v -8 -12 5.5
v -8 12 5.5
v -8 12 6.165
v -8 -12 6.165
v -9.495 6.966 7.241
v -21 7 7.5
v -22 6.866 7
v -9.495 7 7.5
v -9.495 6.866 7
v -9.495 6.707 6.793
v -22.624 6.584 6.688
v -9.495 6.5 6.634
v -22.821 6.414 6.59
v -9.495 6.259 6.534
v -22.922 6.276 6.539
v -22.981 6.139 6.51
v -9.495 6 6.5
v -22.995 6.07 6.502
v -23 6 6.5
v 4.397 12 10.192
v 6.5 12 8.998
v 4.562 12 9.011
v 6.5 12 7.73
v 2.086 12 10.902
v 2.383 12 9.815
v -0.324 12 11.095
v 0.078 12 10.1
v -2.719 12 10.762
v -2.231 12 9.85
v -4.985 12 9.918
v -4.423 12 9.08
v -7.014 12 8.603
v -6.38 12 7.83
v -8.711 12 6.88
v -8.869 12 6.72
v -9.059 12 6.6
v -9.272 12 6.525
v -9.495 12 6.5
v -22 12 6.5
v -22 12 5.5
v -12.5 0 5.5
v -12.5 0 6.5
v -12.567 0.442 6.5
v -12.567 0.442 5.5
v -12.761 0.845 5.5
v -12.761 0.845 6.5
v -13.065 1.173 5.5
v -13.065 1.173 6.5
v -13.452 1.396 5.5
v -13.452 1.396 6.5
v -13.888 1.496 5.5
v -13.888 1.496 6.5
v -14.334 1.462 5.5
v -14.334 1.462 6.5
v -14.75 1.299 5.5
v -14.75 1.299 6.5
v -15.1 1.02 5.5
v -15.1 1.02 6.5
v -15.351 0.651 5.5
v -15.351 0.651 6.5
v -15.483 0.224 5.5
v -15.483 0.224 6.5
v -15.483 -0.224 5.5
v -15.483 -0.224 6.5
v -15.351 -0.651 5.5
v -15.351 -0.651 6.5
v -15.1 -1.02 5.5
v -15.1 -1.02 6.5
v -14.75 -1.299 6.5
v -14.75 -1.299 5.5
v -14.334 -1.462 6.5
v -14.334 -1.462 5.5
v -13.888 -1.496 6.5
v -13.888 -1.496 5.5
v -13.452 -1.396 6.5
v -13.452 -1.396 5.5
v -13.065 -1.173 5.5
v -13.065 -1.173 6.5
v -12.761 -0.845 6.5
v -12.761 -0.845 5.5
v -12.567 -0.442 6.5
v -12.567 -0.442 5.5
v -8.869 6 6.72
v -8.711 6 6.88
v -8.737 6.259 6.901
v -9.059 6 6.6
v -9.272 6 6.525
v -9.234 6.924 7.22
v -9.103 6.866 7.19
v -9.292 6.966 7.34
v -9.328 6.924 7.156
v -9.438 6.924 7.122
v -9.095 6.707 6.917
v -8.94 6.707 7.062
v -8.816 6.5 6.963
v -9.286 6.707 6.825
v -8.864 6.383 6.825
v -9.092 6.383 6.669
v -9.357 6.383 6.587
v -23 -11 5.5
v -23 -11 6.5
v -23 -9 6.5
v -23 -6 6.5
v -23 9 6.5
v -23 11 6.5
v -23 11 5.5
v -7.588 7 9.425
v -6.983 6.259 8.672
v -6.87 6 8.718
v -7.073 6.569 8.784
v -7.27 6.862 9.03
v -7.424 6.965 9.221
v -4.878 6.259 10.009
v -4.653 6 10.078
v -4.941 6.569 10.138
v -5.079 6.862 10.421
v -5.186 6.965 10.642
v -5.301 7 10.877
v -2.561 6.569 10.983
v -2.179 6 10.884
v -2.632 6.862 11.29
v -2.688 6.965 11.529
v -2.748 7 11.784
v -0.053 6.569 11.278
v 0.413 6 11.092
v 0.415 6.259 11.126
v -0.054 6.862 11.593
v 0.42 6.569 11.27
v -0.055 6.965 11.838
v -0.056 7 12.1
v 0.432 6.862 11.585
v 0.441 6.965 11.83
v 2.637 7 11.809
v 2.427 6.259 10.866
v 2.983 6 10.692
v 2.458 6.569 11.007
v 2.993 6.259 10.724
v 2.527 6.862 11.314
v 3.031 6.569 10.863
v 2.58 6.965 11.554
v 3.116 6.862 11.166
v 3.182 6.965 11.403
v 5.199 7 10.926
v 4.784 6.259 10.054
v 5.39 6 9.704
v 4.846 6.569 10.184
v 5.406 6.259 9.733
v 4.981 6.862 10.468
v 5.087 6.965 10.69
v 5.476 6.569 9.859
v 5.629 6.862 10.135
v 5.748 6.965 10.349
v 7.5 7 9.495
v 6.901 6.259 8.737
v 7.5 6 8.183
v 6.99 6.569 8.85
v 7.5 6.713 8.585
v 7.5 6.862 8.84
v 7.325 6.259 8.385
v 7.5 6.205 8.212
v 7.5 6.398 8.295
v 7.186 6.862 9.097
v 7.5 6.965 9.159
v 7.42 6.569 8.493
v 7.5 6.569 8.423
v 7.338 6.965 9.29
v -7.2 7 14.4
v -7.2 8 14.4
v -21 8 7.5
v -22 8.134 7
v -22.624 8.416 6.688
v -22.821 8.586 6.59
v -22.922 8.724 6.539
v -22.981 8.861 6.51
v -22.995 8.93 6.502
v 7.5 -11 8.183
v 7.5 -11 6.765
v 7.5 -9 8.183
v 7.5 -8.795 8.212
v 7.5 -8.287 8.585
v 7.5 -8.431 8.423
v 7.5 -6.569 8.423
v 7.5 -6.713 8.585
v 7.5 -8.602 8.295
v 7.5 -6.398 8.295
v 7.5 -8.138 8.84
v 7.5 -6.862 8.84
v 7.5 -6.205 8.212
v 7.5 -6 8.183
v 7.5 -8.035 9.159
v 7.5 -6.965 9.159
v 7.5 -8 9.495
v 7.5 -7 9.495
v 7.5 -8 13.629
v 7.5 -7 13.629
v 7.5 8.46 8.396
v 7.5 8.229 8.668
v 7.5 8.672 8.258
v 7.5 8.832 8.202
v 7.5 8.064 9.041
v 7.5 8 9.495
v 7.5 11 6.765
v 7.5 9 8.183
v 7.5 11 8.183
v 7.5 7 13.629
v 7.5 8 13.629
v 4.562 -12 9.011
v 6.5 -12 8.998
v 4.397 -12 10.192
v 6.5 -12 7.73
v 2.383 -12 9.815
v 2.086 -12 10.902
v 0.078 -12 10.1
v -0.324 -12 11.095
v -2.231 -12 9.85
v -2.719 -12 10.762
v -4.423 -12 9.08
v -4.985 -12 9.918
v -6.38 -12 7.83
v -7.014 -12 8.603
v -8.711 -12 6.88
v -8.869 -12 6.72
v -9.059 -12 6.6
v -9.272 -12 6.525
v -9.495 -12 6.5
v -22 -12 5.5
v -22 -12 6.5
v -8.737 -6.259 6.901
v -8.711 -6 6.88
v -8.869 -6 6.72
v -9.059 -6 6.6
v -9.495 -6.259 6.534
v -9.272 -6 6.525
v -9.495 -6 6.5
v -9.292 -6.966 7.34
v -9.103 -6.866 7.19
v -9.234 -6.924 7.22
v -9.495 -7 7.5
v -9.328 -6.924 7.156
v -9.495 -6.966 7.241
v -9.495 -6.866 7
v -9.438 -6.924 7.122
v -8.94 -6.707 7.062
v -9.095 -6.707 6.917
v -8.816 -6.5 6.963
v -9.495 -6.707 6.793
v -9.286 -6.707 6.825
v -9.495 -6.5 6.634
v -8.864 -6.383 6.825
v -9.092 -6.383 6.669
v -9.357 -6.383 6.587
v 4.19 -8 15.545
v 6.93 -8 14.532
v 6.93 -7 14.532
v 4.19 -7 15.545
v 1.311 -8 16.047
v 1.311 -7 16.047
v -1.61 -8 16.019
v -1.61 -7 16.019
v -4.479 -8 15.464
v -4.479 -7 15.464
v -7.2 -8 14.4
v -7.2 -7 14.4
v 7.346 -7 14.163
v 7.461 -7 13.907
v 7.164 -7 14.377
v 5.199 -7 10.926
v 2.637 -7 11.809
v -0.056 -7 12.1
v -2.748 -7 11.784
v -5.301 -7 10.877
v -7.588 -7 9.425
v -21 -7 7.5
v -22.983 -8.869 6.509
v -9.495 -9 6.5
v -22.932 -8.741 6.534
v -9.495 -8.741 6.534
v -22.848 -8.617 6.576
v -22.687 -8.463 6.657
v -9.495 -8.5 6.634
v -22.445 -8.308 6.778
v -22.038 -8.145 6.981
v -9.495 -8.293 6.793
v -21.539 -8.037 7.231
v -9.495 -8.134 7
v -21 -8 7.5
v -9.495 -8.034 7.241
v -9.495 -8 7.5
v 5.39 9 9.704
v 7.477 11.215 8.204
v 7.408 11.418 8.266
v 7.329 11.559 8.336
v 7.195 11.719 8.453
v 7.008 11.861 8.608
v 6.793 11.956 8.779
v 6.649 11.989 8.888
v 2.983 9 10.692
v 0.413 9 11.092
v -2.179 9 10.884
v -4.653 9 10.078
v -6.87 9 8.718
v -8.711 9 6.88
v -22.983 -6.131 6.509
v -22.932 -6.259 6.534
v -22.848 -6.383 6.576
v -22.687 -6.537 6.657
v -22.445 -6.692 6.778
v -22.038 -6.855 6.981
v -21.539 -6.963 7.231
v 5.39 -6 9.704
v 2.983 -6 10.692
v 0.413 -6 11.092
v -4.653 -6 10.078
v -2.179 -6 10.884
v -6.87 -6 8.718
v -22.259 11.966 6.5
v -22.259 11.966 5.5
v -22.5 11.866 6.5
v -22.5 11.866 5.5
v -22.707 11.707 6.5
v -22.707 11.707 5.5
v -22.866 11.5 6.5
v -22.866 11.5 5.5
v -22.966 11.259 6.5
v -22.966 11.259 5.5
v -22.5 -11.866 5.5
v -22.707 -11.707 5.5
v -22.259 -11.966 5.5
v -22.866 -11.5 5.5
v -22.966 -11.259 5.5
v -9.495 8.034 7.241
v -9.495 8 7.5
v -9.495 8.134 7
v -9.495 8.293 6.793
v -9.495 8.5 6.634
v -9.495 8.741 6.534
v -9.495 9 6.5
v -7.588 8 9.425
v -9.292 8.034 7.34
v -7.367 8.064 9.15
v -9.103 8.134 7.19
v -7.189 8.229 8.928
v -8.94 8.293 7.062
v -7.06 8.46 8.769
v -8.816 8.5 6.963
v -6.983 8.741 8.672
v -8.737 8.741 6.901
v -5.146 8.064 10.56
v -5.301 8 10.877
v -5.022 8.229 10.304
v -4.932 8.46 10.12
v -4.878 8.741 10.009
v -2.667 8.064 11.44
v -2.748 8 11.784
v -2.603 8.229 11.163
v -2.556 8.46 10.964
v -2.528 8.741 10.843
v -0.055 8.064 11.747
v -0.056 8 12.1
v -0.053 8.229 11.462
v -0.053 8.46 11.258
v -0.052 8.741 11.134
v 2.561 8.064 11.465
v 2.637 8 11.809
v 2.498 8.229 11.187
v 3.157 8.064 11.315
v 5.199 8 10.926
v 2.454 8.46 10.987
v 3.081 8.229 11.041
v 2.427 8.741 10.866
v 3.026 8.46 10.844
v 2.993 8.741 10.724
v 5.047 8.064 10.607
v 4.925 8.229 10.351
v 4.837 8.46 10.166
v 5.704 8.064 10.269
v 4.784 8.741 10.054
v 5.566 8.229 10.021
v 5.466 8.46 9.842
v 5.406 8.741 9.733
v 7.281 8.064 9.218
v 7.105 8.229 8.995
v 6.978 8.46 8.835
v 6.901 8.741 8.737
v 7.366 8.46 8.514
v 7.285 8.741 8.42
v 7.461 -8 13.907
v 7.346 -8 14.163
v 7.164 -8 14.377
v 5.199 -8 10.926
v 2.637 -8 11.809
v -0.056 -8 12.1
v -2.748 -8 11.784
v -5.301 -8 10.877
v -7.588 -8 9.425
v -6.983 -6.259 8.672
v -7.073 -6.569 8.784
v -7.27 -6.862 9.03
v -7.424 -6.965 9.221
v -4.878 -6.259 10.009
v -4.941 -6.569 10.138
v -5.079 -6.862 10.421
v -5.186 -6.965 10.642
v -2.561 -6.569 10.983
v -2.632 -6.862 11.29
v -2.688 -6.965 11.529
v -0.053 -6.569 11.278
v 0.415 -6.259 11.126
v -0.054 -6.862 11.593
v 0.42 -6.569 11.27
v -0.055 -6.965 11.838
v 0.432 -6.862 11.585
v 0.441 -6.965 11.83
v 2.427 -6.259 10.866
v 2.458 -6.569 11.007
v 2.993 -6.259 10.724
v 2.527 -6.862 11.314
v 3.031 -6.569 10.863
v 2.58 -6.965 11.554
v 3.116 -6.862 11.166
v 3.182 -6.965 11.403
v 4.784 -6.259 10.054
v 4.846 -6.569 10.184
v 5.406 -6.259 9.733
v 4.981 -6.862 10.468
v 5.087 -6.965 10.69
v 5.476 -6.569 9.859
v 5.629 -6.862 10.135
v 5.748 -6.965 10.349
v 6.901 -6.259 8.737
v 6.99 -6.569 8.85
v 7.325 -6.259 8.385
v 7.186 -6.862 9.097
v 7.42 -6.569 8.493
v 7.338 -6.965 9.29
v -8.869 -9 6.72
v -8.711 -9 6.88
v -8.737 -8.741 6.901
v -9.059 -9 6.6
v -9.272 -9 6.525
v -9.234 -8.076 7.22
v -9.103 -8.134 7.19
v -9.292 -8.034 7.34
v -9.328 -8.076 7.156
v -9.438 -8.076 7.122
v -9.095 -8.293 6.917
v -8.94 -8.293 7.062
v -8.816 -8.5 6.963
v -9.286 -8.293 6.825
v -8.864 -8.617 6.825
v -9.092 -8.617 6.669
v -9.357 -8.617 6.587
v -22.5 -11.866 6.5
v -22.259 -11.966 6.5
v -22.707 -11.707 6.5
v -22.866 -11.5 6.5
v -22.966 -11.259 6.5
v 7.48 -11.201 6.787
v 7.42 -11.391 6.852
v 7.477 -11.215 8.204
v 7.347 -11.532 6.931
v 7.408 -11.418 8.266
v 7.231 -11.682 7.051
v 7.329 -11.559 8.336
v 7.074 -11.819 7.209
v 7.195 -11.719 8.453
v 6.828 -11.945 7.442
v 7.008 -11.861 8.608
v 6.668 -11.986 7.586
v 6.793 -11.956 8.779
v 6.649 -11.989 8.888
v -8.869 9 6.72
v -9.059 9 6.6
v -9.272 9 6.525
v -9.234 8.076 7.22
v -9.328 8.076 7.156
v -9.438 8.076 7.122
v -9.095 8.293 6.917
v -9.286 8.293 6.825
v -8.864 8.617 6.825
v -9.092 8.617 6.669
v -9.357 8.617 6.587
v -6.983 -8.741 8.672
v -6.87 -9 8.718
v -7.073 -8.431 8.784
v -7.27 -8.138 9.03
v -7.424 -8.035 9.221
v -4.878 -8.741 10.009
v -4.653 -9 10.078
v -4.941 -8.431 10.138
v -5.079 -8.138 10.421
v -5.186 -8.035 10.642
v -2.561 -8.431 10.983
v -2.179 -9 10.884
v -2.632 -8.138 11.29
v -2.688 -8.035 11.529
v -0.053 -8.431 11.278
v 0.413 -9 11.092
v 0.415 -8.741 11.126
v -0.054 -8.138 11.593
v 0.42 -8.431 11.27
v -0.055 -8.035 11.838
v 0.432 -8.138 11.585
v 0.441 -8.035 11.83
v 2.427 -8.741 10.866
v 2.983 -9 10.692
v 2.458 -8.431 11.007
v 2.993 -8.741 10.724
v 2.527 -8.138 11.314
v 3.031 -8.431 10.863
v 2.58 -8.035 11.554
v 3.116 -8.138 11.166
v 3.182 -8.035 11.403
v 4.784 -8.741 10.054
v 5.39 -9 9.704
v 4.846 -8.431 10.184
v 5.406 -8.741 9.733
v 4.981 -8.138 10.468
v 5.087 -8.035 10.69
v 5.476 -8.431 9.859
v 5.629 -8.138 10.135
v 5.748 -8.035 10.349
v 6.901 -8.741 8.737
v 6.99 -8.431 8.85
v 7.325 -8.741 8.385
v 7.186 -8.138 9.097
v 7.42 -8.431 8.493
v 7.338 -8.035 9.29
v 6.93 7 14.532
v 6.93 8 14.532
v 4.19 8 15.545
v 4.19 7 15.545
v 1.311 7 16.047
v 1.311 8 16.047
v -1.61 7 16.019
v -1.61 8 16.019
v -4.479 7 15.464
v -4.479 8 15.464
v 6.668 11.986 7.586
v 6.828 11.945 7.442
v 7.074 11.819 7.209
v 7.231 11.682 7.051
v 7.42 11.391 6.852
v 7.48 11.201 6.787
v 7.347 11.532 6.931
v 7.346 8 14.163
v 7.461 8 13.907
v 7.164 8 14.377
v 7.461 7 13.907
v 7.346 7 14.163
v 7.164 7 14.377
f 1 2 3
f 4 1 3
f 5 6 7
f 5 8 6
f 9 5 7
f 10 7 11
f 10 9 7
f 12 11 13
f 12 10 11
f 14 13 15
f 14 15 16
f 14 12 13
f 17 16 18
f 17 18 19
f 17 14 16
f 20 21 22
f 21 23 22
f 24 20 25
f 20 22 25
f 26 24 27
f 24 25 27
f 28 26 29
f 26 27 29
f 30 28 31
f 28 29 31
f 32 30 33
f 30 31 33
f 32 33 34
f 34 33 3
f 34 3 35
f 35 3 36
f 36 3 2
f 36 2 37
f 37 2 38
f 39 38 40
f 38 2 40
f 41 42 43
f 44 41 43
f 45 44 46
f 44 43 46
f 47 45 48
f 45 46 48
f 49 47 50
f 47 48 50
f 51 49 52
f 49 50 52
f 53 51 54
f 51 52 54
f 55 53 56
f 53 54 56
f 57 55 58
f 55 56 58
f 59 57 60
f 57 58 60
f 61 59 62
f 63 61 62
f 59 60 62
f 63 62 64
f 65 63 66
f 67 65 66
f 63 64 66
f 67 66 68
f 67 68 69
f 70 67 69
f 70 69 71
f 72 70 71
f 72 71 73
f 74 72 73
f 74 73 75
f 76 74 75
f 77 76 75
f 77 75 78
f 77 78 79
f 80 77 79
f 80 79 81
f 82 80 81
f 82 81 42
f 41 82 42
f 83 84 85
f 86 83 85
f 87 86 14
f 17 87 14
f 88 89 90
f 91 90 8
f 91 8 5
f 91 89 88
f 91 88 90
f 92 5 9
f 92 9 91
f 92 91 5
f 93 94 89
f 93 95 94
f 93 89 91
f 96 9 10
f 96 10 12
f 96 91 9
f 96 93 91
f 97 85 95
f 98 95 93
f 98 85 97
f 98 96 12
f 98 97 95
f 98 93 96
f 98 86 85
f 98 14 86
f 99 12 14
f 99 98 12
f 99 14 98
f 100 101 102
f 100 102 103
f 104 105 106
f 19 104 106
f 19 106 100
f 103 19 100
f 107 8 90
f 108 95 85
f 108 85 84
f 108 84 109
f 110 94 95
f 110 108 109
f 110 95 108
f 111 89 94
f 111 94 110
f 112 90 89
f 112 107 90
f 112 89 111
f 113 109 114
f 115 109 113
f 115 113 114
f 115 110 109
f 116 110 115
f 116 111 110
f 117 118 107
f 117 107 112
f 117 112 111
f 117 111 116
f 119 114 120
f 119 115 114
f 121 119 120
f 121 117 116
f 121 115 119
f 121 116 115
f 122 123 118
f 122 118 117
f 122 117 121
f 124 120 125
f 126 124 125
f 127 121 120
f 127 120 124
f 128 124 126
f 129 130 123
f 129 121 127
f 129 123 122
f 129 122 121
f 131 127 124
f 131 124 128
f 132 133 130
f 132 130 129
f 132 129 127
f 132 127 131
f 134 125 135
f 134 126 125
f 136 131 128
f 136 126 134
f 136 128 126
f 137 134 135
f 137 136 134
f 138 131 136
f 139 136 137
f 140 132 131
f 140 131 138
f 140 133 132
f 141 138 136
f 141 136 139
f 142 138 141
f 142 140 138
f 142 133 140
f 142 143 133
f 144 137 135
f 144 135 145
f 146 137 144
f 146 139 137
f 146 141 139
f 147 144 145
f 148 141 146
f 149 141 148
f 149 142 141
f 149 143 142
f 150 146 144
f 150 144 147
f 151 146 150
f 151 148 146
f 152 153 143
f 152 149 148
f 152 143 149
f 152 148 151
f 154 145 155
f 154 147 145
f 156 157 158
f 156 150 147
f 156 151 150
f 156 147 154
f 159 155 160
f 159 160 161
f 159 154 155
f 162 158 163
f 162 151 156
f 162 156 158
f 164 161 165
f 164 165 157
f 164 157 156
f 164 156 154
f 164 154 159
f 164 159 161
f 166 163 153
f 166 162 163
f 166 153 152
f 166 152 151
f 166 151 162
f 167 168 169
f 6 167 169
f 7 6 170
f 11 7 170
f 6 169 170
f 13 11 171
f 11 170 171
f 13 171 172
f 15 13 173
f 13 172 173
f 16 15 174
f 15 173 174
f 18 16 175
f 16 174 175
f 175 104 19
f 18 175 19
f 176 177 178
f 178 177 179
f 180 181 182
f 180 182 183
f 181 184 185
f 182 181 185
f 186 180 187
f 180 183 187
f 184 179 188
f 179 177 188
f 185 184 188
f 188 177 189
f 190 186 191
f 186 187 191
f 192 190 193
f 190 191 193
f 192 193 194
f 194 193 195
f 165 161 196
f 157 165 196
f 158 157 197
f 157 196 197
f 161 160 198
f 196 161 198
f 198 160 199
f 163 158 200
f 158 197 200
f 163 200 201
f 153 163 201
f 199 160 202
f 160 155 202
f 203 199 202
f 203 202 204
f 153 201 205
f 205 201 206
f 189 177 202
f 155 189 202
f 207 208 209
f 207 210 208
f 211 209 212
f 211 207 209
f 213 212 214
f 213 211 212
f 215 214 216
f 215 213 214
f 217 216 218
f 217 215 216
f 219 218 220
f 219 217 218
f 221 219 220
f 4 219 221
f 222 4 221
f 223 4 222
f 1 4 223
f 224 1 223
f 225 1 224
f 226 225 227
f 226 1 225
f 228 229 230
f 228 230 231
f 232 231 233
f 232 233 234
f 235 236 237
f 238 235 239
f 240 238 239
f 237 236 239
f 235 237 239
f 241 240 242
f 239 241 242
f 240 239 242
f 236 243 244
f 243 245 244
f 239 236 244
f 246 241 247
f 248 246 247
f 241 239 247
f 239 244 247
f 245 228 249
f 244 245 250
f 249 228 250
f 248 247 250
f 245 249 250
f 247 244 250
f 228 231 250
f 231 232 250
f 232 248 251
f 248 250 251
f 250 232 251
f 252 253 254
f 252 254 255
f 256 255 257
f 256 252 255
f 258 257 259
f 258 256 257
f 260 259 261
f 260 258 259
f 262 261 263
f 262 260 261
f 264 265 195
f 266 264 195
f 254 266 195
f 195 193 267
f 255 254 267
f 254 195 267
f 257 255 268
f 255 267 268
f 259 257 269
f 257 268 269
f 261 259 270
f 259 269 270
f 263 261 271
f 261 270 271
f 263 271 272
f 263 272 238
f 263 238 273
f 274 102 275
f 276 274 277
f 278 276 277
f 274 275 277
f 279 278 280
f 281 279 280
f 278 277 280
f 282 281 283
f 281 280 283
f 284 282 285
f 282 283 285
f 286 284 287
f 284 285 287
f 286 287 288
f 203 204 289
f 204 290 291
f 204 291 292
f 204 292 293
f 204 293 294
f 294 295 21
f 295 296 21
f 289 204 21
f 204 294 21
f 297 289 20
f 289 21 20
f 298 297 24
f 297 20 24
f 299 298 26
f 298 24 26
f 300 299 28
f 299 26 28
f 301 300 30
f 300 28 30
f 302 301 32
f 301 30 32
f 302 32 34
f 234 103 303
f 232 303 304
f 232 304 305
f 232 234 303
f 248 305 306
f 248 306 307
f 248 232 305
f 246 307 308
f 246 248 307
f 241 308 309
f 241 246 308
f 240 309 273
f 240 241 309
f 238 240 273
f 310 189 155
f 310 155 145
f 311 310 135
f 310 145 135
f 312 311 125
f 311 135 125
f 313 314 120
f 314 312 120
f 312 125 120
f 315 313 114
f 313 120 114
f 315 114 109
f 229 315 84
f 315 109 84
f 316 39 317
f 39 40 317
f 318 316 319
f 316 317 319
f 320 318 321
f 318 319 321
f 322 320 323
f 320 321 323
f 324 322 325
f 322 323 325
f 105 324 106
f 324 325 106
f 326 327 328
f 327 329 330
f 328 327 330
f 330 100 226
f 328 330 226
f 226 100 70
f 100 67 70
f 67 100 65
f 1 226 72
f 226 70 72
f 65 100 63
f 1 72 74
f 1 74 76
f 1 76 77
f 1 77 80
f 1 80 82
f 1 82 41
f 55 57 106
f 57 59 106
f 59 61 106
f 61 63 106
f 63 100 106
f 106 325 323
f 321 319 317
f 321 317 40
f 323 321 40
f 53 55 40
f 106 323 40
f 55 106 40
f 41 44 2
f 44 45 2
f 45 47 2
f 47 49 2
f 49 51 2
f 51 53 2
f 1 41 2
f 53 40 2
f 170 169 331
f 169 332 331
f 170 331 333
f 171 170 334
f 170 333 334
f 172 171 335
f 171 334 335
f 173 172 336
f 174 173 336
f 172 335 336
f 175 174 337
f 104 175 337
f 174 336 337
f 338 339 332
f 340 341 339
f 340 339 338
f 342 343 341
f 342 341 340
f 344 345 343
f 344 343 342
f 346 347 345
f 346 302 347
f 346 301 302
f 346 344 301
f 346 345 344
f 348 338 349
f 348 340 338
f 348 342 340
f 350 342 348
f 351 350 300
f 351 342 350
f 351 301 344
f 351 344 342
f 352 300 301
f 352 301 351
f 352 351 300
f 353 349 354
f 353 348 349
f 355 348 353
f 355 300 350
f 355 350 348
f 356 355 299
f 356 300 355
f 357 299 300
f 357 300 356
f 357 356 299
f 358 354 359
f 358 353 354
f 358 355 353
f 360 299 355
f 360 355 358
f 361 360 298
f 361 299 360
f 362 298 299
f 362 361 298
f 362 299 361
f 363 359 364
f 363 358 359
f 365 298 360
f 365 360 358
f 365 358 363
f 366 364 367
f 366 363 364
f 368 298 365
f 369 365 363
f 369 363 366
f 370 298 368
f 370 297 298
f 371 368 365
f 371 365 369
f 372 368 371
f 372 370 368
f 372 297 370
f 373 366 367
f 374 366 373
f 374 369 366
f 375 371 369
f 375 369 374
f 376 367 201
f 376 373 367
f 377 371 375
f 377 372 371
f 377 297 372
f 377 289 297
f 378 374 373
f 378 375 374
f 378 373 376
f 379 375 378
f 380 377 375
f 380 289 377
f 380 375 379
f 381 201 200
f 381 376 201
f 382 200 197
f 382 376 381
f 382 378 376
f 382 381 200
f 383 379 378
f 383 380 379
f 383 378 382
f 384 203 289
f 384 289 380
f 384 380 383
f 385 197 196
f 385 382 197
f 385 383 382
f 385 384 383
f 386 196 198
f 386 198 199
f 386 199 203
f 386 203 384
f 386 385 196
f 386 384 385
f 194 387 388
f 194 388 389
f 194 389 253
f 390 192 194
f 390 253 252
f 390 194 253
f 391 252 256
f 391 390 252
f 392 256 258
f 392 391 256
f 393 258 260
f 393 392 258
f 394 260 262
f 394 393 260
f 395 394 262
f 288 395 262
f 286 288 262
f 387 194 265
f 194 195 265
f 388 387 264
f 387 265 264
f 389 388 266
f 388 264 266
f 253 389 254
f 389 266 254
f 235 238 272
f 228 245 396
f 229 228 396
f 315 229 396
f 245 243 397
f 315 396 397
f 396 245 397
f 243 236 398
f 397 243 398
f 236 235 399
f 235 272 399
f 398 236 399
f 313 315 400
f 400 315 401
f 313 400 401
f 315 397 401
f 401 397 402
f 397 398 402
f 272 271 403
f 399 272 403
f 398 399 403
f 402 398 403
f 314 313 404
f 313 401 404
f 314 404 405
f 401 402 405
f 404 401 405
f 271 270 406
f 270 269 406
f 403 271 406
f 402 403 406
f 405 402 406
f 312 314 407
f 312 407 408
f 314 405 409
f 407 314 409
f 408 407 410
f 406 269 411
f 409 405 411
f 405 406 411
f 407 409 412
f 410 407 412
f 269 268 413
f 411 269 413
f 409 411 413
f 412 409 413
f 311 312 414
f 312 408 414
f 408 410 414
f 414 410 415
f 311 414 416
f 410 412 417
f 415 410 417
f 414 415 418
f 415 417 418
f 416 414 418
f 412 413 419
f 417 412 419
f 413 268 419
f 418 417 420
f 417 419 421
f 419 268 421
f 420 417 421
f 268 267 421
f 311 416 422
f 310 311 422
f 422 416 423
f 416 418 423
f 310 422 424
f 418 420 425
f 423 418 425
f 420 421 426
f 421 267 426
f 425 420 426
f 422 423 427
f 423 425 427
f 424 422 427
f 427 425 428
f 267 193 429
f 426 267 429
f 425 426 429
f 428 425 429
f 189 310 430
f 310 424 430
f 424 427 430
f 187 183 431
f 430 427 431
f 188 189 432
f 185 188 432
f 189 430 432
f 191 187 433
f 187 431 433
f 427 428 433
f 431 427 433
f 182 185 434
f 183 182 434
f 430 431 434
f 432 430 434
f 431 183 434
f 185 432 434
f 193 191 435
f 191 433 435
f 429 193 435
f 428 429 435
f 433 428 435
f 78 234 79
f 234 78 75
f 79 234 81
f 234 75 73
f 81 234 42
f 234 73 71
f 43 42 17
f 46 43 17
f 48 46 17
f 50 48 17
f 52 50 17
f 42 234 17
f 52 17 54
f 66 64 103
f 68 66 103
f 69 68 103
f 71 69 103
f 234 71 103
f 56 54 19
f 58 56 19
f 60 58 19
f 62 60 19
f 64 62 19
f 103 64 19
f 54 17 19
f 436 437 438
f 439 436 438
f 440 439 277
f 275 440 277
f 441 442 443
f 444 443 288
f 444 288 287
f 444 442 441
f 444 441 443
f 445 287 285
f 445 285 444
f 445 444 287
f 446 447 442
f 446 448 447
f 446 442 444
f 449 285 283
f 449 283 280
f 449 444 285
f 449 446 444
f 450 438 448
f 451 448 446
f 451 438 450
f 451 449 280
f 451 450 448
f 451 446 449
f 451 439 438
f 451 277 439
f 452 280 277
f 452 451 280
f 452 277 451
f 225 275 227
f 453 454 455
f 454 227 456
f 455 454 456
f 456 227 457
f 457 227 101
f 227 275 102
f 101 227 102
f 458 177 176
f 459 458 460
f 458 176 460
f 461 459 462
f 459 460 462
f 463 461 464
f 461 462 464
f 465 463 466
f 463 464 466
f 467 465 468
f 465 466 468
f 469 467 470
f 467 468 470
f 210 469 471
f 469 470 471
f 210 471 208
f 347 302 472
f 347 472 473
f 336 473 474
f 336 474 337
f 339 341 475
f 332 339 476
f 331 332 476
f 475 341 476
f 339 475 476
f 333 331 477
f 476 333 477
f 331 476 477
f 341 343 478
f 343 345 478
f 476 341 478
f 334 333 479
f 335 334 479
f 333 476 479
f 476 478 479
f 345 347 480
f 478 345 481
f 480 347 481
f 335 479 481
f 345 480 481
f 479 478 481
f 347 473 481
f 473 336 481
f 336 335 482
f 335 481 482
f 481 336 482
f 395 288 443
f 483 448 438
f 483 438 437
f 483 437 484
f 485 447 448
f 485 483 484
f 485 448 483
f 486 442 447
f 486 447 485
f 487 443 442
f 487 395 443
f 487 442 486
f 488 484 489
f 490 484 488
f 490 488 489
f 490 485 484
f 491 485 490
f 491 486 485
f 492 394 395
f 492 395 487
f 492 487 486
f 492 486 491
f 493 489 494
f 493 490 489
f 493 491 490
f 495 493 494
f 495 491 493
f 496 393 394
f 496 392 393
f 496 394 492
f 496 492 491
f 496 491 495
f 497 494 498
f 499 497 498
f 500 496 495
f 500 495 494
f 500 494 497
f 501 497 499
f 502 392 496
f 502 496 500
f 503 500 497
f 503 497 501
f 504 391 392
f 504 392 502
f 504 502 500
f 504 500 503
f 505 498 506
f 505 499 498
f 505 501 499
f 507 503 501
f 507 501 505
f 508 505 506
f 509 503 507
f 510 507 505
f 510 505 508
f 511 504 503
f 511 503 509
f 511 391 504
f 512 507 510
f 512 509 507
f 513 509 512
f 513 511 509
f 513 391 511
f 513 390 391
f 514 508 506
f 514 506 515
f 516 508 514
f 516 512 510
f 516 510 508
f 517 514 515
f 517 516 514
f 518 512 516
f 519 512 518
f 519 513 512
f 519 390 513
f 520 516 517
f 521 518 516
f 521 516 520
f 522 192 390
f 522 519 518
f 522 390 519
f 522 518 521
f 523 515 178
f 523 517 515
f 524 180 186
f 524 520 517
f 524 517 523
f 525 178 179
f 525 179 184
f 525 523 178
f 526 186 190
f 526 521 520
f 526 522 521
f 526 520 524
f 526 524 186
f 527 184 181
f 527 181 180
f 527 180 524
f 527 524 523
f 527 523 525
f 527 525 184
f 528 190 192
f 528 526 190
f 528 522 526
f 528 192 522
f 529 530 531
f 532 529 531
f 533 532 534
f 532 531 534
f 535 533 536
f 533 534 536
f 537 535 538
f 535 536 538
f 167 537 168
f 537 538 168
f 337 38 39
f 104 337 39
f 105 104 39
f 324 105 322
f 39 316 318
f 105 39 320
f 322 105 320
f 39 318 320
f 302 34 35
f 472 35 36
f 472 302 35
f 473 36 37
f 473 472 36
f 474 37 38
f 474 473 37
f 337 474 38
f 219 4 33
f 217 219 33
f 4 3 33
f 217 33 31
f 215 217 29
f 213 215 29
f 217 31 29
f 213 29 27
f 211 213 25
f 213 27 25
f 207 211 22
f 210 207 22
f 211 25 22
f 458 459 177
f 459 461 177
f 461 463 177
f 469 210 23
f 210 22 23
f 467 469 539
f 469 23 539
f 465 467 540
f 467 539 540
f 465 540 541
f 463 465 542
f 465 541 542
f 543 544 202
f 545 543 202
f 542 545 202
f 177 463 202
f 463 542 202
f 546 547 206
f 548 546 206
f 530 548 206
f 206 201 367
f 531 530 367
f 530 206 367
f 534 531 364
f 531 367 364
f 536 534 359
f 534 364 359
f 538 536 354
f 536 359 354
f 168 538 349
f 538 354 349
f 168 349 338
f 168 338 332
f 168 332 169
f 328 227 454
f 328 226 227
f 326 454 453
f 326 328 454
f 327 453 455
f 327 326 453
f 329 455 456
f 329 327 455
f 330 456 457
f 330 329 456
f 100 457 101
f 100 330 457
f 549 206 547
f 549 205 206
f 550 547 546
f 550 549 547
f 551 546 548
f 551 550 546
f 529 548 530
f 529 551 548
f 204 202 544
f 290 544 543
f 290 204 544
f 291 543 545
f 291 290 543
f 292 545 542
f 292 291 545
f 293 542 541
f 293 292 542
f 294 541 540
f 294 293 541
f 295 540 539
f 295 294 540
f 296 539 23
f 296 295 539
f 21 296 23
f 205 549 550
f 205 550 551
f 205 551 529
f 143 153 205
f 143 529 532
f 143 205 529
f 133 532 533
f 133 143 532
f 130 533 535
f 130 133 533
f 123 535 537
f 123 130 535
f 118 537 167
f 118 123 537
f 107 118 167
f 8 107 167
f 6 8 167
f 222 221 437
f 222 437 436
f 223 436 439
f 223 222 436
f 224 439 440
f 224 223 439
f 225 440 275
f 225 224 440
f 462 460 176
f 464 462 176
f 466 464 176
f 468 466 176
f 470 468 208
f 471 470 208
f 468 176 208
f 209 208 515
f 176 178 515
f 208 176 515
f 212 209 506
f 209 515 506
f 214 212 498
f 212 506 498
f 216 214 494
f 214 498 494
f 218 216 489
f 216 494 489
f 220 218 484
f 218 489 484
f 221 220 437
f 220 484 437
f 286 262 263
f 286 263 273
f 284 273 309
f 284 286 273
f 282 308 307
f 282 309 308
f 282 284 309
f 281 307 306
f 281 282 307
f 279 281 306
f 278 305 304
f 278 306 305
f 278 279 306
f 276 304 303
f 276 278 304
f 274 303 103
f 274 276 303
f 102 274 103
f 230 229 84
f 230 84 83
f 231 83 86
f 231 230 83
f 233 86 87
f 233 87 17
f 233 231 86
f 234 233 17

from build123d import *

# Parameters (mm, degrees)
BOSS_EXTRU_1_DEPTH      = 12
BOSS_EXTRU_2_START      = -4
BOSS_EXTRU_2_DEPTH      = 1
CONG_1_R                = 1
ESQUISSE3_R             = 1.5
ENL_V_MAT_EXTRU_1_DEPTH = 28.66152567


with BuildPart() as part:
    # Esquisse1 → Boss.-Extru.1 (new, symmetric)
    with BuildSketch(Plane(origin=(0, 0, 0), x_dir=(1, 0, 0), z_dir=(0, 1, 0))):
        with BuildLine():
            Line((7.5, -6.76461381), (7.5, -8.182909018))
            ThreePointArc((7.5, -8.182909018), (-1.126445761, -11.042695321), (-8.997777503, -6.5))
            Line((-8.997777503, -6.5), (-23, -6.5))
            Line((-23, -6.5), (-23, -5.5))
            Line((-23, -5.5), (-8, -5.5))
            Line((-8, -5.5), (-8, -6.165225057))
            ThreePointArc((-8, -6.165225057), (-0.390277747, -10.092456751), (7.5, -6.76461381))
        make_face()
    extrude(amount=BOSS_EXTRU_1_DEPTH, both=True)

    # Esquisse2 → Boss.-Extru.2 (add)
    with BuildSketch(Plane(origin=(0, 12, 0), x_dir=(1, 0, 0), z_dir=(0, 1, 0)).offset(BOSS_EXTRU_2_START)):
        with BuildLine():
            Line((7.5, -8.182909018), (7.5, -14.246403055))
            ThreePointArc((7.5, -14.246403055), (0.168377113, -16.099119515), (-7.200392055, -14.400151188))
            Line((-7.200392055, -14.400151188), (-23, -6.5))
            Line((-23, -6.5), (-8.997777503, -6.5))
            ThreePointArc((-8.997777503, -6.5), (-1.126445761, -11.042695321), (7.5, -8.182909018))
        make_face()
    boss_extru_2 = extrude(amount=-BOSS_EXTRU_2_DEPTH)

    # Symétrie1: Boss.-Extru.2 across plane
    add(boss_extru_2.mirror(Plane.ZX))

    # Congé1
    cong_1_edges = [part.edges().sort_by_distance(p)[0] for p in [
        (-8.997777503, 10, 6.5),
        (7.5, 12, 7.473761414),
        (-8.997777503, 0, 6.5),
        (-1.126445761, 7, 11.042695321),
        (7.5, 7.5, 14.246403055),
        (-15.998888752, 7, 6.5),
        (-1.126445761, 8, 11.042695321),
        (-15.998888752, 8, 6.5),
        (-8.997777503, -10, 6.5),
        (-23, 12, 6),
        (-1.126445761, -8, 11.042695321),
        (-15.998888752, -8, 6.5),
        (7.5, -7.5, 14.246403055),
        (-1.126445761, -7, 11.042695321),
        (-15.998888752, -7, 6.5),
        (7.5, -12, 7.473761414),
        (-23, -12, 6),
    ]]
    fillet(cong_1_edges, radius=CONG_1_R)

    # Esquisse3 → Enlèv. mat.-Extru.1 (cut, through all)
    with BuildSketch(Plane.XY.offset(6.5)):
        with Locations((-14, 0)):
            Circle(ESQUISSE3_R)
    extrude(amount=-ENL_V_MAT_EXTRU_1_DEPTH, mode=Mode.SUBTRACT)


solid = part.part
